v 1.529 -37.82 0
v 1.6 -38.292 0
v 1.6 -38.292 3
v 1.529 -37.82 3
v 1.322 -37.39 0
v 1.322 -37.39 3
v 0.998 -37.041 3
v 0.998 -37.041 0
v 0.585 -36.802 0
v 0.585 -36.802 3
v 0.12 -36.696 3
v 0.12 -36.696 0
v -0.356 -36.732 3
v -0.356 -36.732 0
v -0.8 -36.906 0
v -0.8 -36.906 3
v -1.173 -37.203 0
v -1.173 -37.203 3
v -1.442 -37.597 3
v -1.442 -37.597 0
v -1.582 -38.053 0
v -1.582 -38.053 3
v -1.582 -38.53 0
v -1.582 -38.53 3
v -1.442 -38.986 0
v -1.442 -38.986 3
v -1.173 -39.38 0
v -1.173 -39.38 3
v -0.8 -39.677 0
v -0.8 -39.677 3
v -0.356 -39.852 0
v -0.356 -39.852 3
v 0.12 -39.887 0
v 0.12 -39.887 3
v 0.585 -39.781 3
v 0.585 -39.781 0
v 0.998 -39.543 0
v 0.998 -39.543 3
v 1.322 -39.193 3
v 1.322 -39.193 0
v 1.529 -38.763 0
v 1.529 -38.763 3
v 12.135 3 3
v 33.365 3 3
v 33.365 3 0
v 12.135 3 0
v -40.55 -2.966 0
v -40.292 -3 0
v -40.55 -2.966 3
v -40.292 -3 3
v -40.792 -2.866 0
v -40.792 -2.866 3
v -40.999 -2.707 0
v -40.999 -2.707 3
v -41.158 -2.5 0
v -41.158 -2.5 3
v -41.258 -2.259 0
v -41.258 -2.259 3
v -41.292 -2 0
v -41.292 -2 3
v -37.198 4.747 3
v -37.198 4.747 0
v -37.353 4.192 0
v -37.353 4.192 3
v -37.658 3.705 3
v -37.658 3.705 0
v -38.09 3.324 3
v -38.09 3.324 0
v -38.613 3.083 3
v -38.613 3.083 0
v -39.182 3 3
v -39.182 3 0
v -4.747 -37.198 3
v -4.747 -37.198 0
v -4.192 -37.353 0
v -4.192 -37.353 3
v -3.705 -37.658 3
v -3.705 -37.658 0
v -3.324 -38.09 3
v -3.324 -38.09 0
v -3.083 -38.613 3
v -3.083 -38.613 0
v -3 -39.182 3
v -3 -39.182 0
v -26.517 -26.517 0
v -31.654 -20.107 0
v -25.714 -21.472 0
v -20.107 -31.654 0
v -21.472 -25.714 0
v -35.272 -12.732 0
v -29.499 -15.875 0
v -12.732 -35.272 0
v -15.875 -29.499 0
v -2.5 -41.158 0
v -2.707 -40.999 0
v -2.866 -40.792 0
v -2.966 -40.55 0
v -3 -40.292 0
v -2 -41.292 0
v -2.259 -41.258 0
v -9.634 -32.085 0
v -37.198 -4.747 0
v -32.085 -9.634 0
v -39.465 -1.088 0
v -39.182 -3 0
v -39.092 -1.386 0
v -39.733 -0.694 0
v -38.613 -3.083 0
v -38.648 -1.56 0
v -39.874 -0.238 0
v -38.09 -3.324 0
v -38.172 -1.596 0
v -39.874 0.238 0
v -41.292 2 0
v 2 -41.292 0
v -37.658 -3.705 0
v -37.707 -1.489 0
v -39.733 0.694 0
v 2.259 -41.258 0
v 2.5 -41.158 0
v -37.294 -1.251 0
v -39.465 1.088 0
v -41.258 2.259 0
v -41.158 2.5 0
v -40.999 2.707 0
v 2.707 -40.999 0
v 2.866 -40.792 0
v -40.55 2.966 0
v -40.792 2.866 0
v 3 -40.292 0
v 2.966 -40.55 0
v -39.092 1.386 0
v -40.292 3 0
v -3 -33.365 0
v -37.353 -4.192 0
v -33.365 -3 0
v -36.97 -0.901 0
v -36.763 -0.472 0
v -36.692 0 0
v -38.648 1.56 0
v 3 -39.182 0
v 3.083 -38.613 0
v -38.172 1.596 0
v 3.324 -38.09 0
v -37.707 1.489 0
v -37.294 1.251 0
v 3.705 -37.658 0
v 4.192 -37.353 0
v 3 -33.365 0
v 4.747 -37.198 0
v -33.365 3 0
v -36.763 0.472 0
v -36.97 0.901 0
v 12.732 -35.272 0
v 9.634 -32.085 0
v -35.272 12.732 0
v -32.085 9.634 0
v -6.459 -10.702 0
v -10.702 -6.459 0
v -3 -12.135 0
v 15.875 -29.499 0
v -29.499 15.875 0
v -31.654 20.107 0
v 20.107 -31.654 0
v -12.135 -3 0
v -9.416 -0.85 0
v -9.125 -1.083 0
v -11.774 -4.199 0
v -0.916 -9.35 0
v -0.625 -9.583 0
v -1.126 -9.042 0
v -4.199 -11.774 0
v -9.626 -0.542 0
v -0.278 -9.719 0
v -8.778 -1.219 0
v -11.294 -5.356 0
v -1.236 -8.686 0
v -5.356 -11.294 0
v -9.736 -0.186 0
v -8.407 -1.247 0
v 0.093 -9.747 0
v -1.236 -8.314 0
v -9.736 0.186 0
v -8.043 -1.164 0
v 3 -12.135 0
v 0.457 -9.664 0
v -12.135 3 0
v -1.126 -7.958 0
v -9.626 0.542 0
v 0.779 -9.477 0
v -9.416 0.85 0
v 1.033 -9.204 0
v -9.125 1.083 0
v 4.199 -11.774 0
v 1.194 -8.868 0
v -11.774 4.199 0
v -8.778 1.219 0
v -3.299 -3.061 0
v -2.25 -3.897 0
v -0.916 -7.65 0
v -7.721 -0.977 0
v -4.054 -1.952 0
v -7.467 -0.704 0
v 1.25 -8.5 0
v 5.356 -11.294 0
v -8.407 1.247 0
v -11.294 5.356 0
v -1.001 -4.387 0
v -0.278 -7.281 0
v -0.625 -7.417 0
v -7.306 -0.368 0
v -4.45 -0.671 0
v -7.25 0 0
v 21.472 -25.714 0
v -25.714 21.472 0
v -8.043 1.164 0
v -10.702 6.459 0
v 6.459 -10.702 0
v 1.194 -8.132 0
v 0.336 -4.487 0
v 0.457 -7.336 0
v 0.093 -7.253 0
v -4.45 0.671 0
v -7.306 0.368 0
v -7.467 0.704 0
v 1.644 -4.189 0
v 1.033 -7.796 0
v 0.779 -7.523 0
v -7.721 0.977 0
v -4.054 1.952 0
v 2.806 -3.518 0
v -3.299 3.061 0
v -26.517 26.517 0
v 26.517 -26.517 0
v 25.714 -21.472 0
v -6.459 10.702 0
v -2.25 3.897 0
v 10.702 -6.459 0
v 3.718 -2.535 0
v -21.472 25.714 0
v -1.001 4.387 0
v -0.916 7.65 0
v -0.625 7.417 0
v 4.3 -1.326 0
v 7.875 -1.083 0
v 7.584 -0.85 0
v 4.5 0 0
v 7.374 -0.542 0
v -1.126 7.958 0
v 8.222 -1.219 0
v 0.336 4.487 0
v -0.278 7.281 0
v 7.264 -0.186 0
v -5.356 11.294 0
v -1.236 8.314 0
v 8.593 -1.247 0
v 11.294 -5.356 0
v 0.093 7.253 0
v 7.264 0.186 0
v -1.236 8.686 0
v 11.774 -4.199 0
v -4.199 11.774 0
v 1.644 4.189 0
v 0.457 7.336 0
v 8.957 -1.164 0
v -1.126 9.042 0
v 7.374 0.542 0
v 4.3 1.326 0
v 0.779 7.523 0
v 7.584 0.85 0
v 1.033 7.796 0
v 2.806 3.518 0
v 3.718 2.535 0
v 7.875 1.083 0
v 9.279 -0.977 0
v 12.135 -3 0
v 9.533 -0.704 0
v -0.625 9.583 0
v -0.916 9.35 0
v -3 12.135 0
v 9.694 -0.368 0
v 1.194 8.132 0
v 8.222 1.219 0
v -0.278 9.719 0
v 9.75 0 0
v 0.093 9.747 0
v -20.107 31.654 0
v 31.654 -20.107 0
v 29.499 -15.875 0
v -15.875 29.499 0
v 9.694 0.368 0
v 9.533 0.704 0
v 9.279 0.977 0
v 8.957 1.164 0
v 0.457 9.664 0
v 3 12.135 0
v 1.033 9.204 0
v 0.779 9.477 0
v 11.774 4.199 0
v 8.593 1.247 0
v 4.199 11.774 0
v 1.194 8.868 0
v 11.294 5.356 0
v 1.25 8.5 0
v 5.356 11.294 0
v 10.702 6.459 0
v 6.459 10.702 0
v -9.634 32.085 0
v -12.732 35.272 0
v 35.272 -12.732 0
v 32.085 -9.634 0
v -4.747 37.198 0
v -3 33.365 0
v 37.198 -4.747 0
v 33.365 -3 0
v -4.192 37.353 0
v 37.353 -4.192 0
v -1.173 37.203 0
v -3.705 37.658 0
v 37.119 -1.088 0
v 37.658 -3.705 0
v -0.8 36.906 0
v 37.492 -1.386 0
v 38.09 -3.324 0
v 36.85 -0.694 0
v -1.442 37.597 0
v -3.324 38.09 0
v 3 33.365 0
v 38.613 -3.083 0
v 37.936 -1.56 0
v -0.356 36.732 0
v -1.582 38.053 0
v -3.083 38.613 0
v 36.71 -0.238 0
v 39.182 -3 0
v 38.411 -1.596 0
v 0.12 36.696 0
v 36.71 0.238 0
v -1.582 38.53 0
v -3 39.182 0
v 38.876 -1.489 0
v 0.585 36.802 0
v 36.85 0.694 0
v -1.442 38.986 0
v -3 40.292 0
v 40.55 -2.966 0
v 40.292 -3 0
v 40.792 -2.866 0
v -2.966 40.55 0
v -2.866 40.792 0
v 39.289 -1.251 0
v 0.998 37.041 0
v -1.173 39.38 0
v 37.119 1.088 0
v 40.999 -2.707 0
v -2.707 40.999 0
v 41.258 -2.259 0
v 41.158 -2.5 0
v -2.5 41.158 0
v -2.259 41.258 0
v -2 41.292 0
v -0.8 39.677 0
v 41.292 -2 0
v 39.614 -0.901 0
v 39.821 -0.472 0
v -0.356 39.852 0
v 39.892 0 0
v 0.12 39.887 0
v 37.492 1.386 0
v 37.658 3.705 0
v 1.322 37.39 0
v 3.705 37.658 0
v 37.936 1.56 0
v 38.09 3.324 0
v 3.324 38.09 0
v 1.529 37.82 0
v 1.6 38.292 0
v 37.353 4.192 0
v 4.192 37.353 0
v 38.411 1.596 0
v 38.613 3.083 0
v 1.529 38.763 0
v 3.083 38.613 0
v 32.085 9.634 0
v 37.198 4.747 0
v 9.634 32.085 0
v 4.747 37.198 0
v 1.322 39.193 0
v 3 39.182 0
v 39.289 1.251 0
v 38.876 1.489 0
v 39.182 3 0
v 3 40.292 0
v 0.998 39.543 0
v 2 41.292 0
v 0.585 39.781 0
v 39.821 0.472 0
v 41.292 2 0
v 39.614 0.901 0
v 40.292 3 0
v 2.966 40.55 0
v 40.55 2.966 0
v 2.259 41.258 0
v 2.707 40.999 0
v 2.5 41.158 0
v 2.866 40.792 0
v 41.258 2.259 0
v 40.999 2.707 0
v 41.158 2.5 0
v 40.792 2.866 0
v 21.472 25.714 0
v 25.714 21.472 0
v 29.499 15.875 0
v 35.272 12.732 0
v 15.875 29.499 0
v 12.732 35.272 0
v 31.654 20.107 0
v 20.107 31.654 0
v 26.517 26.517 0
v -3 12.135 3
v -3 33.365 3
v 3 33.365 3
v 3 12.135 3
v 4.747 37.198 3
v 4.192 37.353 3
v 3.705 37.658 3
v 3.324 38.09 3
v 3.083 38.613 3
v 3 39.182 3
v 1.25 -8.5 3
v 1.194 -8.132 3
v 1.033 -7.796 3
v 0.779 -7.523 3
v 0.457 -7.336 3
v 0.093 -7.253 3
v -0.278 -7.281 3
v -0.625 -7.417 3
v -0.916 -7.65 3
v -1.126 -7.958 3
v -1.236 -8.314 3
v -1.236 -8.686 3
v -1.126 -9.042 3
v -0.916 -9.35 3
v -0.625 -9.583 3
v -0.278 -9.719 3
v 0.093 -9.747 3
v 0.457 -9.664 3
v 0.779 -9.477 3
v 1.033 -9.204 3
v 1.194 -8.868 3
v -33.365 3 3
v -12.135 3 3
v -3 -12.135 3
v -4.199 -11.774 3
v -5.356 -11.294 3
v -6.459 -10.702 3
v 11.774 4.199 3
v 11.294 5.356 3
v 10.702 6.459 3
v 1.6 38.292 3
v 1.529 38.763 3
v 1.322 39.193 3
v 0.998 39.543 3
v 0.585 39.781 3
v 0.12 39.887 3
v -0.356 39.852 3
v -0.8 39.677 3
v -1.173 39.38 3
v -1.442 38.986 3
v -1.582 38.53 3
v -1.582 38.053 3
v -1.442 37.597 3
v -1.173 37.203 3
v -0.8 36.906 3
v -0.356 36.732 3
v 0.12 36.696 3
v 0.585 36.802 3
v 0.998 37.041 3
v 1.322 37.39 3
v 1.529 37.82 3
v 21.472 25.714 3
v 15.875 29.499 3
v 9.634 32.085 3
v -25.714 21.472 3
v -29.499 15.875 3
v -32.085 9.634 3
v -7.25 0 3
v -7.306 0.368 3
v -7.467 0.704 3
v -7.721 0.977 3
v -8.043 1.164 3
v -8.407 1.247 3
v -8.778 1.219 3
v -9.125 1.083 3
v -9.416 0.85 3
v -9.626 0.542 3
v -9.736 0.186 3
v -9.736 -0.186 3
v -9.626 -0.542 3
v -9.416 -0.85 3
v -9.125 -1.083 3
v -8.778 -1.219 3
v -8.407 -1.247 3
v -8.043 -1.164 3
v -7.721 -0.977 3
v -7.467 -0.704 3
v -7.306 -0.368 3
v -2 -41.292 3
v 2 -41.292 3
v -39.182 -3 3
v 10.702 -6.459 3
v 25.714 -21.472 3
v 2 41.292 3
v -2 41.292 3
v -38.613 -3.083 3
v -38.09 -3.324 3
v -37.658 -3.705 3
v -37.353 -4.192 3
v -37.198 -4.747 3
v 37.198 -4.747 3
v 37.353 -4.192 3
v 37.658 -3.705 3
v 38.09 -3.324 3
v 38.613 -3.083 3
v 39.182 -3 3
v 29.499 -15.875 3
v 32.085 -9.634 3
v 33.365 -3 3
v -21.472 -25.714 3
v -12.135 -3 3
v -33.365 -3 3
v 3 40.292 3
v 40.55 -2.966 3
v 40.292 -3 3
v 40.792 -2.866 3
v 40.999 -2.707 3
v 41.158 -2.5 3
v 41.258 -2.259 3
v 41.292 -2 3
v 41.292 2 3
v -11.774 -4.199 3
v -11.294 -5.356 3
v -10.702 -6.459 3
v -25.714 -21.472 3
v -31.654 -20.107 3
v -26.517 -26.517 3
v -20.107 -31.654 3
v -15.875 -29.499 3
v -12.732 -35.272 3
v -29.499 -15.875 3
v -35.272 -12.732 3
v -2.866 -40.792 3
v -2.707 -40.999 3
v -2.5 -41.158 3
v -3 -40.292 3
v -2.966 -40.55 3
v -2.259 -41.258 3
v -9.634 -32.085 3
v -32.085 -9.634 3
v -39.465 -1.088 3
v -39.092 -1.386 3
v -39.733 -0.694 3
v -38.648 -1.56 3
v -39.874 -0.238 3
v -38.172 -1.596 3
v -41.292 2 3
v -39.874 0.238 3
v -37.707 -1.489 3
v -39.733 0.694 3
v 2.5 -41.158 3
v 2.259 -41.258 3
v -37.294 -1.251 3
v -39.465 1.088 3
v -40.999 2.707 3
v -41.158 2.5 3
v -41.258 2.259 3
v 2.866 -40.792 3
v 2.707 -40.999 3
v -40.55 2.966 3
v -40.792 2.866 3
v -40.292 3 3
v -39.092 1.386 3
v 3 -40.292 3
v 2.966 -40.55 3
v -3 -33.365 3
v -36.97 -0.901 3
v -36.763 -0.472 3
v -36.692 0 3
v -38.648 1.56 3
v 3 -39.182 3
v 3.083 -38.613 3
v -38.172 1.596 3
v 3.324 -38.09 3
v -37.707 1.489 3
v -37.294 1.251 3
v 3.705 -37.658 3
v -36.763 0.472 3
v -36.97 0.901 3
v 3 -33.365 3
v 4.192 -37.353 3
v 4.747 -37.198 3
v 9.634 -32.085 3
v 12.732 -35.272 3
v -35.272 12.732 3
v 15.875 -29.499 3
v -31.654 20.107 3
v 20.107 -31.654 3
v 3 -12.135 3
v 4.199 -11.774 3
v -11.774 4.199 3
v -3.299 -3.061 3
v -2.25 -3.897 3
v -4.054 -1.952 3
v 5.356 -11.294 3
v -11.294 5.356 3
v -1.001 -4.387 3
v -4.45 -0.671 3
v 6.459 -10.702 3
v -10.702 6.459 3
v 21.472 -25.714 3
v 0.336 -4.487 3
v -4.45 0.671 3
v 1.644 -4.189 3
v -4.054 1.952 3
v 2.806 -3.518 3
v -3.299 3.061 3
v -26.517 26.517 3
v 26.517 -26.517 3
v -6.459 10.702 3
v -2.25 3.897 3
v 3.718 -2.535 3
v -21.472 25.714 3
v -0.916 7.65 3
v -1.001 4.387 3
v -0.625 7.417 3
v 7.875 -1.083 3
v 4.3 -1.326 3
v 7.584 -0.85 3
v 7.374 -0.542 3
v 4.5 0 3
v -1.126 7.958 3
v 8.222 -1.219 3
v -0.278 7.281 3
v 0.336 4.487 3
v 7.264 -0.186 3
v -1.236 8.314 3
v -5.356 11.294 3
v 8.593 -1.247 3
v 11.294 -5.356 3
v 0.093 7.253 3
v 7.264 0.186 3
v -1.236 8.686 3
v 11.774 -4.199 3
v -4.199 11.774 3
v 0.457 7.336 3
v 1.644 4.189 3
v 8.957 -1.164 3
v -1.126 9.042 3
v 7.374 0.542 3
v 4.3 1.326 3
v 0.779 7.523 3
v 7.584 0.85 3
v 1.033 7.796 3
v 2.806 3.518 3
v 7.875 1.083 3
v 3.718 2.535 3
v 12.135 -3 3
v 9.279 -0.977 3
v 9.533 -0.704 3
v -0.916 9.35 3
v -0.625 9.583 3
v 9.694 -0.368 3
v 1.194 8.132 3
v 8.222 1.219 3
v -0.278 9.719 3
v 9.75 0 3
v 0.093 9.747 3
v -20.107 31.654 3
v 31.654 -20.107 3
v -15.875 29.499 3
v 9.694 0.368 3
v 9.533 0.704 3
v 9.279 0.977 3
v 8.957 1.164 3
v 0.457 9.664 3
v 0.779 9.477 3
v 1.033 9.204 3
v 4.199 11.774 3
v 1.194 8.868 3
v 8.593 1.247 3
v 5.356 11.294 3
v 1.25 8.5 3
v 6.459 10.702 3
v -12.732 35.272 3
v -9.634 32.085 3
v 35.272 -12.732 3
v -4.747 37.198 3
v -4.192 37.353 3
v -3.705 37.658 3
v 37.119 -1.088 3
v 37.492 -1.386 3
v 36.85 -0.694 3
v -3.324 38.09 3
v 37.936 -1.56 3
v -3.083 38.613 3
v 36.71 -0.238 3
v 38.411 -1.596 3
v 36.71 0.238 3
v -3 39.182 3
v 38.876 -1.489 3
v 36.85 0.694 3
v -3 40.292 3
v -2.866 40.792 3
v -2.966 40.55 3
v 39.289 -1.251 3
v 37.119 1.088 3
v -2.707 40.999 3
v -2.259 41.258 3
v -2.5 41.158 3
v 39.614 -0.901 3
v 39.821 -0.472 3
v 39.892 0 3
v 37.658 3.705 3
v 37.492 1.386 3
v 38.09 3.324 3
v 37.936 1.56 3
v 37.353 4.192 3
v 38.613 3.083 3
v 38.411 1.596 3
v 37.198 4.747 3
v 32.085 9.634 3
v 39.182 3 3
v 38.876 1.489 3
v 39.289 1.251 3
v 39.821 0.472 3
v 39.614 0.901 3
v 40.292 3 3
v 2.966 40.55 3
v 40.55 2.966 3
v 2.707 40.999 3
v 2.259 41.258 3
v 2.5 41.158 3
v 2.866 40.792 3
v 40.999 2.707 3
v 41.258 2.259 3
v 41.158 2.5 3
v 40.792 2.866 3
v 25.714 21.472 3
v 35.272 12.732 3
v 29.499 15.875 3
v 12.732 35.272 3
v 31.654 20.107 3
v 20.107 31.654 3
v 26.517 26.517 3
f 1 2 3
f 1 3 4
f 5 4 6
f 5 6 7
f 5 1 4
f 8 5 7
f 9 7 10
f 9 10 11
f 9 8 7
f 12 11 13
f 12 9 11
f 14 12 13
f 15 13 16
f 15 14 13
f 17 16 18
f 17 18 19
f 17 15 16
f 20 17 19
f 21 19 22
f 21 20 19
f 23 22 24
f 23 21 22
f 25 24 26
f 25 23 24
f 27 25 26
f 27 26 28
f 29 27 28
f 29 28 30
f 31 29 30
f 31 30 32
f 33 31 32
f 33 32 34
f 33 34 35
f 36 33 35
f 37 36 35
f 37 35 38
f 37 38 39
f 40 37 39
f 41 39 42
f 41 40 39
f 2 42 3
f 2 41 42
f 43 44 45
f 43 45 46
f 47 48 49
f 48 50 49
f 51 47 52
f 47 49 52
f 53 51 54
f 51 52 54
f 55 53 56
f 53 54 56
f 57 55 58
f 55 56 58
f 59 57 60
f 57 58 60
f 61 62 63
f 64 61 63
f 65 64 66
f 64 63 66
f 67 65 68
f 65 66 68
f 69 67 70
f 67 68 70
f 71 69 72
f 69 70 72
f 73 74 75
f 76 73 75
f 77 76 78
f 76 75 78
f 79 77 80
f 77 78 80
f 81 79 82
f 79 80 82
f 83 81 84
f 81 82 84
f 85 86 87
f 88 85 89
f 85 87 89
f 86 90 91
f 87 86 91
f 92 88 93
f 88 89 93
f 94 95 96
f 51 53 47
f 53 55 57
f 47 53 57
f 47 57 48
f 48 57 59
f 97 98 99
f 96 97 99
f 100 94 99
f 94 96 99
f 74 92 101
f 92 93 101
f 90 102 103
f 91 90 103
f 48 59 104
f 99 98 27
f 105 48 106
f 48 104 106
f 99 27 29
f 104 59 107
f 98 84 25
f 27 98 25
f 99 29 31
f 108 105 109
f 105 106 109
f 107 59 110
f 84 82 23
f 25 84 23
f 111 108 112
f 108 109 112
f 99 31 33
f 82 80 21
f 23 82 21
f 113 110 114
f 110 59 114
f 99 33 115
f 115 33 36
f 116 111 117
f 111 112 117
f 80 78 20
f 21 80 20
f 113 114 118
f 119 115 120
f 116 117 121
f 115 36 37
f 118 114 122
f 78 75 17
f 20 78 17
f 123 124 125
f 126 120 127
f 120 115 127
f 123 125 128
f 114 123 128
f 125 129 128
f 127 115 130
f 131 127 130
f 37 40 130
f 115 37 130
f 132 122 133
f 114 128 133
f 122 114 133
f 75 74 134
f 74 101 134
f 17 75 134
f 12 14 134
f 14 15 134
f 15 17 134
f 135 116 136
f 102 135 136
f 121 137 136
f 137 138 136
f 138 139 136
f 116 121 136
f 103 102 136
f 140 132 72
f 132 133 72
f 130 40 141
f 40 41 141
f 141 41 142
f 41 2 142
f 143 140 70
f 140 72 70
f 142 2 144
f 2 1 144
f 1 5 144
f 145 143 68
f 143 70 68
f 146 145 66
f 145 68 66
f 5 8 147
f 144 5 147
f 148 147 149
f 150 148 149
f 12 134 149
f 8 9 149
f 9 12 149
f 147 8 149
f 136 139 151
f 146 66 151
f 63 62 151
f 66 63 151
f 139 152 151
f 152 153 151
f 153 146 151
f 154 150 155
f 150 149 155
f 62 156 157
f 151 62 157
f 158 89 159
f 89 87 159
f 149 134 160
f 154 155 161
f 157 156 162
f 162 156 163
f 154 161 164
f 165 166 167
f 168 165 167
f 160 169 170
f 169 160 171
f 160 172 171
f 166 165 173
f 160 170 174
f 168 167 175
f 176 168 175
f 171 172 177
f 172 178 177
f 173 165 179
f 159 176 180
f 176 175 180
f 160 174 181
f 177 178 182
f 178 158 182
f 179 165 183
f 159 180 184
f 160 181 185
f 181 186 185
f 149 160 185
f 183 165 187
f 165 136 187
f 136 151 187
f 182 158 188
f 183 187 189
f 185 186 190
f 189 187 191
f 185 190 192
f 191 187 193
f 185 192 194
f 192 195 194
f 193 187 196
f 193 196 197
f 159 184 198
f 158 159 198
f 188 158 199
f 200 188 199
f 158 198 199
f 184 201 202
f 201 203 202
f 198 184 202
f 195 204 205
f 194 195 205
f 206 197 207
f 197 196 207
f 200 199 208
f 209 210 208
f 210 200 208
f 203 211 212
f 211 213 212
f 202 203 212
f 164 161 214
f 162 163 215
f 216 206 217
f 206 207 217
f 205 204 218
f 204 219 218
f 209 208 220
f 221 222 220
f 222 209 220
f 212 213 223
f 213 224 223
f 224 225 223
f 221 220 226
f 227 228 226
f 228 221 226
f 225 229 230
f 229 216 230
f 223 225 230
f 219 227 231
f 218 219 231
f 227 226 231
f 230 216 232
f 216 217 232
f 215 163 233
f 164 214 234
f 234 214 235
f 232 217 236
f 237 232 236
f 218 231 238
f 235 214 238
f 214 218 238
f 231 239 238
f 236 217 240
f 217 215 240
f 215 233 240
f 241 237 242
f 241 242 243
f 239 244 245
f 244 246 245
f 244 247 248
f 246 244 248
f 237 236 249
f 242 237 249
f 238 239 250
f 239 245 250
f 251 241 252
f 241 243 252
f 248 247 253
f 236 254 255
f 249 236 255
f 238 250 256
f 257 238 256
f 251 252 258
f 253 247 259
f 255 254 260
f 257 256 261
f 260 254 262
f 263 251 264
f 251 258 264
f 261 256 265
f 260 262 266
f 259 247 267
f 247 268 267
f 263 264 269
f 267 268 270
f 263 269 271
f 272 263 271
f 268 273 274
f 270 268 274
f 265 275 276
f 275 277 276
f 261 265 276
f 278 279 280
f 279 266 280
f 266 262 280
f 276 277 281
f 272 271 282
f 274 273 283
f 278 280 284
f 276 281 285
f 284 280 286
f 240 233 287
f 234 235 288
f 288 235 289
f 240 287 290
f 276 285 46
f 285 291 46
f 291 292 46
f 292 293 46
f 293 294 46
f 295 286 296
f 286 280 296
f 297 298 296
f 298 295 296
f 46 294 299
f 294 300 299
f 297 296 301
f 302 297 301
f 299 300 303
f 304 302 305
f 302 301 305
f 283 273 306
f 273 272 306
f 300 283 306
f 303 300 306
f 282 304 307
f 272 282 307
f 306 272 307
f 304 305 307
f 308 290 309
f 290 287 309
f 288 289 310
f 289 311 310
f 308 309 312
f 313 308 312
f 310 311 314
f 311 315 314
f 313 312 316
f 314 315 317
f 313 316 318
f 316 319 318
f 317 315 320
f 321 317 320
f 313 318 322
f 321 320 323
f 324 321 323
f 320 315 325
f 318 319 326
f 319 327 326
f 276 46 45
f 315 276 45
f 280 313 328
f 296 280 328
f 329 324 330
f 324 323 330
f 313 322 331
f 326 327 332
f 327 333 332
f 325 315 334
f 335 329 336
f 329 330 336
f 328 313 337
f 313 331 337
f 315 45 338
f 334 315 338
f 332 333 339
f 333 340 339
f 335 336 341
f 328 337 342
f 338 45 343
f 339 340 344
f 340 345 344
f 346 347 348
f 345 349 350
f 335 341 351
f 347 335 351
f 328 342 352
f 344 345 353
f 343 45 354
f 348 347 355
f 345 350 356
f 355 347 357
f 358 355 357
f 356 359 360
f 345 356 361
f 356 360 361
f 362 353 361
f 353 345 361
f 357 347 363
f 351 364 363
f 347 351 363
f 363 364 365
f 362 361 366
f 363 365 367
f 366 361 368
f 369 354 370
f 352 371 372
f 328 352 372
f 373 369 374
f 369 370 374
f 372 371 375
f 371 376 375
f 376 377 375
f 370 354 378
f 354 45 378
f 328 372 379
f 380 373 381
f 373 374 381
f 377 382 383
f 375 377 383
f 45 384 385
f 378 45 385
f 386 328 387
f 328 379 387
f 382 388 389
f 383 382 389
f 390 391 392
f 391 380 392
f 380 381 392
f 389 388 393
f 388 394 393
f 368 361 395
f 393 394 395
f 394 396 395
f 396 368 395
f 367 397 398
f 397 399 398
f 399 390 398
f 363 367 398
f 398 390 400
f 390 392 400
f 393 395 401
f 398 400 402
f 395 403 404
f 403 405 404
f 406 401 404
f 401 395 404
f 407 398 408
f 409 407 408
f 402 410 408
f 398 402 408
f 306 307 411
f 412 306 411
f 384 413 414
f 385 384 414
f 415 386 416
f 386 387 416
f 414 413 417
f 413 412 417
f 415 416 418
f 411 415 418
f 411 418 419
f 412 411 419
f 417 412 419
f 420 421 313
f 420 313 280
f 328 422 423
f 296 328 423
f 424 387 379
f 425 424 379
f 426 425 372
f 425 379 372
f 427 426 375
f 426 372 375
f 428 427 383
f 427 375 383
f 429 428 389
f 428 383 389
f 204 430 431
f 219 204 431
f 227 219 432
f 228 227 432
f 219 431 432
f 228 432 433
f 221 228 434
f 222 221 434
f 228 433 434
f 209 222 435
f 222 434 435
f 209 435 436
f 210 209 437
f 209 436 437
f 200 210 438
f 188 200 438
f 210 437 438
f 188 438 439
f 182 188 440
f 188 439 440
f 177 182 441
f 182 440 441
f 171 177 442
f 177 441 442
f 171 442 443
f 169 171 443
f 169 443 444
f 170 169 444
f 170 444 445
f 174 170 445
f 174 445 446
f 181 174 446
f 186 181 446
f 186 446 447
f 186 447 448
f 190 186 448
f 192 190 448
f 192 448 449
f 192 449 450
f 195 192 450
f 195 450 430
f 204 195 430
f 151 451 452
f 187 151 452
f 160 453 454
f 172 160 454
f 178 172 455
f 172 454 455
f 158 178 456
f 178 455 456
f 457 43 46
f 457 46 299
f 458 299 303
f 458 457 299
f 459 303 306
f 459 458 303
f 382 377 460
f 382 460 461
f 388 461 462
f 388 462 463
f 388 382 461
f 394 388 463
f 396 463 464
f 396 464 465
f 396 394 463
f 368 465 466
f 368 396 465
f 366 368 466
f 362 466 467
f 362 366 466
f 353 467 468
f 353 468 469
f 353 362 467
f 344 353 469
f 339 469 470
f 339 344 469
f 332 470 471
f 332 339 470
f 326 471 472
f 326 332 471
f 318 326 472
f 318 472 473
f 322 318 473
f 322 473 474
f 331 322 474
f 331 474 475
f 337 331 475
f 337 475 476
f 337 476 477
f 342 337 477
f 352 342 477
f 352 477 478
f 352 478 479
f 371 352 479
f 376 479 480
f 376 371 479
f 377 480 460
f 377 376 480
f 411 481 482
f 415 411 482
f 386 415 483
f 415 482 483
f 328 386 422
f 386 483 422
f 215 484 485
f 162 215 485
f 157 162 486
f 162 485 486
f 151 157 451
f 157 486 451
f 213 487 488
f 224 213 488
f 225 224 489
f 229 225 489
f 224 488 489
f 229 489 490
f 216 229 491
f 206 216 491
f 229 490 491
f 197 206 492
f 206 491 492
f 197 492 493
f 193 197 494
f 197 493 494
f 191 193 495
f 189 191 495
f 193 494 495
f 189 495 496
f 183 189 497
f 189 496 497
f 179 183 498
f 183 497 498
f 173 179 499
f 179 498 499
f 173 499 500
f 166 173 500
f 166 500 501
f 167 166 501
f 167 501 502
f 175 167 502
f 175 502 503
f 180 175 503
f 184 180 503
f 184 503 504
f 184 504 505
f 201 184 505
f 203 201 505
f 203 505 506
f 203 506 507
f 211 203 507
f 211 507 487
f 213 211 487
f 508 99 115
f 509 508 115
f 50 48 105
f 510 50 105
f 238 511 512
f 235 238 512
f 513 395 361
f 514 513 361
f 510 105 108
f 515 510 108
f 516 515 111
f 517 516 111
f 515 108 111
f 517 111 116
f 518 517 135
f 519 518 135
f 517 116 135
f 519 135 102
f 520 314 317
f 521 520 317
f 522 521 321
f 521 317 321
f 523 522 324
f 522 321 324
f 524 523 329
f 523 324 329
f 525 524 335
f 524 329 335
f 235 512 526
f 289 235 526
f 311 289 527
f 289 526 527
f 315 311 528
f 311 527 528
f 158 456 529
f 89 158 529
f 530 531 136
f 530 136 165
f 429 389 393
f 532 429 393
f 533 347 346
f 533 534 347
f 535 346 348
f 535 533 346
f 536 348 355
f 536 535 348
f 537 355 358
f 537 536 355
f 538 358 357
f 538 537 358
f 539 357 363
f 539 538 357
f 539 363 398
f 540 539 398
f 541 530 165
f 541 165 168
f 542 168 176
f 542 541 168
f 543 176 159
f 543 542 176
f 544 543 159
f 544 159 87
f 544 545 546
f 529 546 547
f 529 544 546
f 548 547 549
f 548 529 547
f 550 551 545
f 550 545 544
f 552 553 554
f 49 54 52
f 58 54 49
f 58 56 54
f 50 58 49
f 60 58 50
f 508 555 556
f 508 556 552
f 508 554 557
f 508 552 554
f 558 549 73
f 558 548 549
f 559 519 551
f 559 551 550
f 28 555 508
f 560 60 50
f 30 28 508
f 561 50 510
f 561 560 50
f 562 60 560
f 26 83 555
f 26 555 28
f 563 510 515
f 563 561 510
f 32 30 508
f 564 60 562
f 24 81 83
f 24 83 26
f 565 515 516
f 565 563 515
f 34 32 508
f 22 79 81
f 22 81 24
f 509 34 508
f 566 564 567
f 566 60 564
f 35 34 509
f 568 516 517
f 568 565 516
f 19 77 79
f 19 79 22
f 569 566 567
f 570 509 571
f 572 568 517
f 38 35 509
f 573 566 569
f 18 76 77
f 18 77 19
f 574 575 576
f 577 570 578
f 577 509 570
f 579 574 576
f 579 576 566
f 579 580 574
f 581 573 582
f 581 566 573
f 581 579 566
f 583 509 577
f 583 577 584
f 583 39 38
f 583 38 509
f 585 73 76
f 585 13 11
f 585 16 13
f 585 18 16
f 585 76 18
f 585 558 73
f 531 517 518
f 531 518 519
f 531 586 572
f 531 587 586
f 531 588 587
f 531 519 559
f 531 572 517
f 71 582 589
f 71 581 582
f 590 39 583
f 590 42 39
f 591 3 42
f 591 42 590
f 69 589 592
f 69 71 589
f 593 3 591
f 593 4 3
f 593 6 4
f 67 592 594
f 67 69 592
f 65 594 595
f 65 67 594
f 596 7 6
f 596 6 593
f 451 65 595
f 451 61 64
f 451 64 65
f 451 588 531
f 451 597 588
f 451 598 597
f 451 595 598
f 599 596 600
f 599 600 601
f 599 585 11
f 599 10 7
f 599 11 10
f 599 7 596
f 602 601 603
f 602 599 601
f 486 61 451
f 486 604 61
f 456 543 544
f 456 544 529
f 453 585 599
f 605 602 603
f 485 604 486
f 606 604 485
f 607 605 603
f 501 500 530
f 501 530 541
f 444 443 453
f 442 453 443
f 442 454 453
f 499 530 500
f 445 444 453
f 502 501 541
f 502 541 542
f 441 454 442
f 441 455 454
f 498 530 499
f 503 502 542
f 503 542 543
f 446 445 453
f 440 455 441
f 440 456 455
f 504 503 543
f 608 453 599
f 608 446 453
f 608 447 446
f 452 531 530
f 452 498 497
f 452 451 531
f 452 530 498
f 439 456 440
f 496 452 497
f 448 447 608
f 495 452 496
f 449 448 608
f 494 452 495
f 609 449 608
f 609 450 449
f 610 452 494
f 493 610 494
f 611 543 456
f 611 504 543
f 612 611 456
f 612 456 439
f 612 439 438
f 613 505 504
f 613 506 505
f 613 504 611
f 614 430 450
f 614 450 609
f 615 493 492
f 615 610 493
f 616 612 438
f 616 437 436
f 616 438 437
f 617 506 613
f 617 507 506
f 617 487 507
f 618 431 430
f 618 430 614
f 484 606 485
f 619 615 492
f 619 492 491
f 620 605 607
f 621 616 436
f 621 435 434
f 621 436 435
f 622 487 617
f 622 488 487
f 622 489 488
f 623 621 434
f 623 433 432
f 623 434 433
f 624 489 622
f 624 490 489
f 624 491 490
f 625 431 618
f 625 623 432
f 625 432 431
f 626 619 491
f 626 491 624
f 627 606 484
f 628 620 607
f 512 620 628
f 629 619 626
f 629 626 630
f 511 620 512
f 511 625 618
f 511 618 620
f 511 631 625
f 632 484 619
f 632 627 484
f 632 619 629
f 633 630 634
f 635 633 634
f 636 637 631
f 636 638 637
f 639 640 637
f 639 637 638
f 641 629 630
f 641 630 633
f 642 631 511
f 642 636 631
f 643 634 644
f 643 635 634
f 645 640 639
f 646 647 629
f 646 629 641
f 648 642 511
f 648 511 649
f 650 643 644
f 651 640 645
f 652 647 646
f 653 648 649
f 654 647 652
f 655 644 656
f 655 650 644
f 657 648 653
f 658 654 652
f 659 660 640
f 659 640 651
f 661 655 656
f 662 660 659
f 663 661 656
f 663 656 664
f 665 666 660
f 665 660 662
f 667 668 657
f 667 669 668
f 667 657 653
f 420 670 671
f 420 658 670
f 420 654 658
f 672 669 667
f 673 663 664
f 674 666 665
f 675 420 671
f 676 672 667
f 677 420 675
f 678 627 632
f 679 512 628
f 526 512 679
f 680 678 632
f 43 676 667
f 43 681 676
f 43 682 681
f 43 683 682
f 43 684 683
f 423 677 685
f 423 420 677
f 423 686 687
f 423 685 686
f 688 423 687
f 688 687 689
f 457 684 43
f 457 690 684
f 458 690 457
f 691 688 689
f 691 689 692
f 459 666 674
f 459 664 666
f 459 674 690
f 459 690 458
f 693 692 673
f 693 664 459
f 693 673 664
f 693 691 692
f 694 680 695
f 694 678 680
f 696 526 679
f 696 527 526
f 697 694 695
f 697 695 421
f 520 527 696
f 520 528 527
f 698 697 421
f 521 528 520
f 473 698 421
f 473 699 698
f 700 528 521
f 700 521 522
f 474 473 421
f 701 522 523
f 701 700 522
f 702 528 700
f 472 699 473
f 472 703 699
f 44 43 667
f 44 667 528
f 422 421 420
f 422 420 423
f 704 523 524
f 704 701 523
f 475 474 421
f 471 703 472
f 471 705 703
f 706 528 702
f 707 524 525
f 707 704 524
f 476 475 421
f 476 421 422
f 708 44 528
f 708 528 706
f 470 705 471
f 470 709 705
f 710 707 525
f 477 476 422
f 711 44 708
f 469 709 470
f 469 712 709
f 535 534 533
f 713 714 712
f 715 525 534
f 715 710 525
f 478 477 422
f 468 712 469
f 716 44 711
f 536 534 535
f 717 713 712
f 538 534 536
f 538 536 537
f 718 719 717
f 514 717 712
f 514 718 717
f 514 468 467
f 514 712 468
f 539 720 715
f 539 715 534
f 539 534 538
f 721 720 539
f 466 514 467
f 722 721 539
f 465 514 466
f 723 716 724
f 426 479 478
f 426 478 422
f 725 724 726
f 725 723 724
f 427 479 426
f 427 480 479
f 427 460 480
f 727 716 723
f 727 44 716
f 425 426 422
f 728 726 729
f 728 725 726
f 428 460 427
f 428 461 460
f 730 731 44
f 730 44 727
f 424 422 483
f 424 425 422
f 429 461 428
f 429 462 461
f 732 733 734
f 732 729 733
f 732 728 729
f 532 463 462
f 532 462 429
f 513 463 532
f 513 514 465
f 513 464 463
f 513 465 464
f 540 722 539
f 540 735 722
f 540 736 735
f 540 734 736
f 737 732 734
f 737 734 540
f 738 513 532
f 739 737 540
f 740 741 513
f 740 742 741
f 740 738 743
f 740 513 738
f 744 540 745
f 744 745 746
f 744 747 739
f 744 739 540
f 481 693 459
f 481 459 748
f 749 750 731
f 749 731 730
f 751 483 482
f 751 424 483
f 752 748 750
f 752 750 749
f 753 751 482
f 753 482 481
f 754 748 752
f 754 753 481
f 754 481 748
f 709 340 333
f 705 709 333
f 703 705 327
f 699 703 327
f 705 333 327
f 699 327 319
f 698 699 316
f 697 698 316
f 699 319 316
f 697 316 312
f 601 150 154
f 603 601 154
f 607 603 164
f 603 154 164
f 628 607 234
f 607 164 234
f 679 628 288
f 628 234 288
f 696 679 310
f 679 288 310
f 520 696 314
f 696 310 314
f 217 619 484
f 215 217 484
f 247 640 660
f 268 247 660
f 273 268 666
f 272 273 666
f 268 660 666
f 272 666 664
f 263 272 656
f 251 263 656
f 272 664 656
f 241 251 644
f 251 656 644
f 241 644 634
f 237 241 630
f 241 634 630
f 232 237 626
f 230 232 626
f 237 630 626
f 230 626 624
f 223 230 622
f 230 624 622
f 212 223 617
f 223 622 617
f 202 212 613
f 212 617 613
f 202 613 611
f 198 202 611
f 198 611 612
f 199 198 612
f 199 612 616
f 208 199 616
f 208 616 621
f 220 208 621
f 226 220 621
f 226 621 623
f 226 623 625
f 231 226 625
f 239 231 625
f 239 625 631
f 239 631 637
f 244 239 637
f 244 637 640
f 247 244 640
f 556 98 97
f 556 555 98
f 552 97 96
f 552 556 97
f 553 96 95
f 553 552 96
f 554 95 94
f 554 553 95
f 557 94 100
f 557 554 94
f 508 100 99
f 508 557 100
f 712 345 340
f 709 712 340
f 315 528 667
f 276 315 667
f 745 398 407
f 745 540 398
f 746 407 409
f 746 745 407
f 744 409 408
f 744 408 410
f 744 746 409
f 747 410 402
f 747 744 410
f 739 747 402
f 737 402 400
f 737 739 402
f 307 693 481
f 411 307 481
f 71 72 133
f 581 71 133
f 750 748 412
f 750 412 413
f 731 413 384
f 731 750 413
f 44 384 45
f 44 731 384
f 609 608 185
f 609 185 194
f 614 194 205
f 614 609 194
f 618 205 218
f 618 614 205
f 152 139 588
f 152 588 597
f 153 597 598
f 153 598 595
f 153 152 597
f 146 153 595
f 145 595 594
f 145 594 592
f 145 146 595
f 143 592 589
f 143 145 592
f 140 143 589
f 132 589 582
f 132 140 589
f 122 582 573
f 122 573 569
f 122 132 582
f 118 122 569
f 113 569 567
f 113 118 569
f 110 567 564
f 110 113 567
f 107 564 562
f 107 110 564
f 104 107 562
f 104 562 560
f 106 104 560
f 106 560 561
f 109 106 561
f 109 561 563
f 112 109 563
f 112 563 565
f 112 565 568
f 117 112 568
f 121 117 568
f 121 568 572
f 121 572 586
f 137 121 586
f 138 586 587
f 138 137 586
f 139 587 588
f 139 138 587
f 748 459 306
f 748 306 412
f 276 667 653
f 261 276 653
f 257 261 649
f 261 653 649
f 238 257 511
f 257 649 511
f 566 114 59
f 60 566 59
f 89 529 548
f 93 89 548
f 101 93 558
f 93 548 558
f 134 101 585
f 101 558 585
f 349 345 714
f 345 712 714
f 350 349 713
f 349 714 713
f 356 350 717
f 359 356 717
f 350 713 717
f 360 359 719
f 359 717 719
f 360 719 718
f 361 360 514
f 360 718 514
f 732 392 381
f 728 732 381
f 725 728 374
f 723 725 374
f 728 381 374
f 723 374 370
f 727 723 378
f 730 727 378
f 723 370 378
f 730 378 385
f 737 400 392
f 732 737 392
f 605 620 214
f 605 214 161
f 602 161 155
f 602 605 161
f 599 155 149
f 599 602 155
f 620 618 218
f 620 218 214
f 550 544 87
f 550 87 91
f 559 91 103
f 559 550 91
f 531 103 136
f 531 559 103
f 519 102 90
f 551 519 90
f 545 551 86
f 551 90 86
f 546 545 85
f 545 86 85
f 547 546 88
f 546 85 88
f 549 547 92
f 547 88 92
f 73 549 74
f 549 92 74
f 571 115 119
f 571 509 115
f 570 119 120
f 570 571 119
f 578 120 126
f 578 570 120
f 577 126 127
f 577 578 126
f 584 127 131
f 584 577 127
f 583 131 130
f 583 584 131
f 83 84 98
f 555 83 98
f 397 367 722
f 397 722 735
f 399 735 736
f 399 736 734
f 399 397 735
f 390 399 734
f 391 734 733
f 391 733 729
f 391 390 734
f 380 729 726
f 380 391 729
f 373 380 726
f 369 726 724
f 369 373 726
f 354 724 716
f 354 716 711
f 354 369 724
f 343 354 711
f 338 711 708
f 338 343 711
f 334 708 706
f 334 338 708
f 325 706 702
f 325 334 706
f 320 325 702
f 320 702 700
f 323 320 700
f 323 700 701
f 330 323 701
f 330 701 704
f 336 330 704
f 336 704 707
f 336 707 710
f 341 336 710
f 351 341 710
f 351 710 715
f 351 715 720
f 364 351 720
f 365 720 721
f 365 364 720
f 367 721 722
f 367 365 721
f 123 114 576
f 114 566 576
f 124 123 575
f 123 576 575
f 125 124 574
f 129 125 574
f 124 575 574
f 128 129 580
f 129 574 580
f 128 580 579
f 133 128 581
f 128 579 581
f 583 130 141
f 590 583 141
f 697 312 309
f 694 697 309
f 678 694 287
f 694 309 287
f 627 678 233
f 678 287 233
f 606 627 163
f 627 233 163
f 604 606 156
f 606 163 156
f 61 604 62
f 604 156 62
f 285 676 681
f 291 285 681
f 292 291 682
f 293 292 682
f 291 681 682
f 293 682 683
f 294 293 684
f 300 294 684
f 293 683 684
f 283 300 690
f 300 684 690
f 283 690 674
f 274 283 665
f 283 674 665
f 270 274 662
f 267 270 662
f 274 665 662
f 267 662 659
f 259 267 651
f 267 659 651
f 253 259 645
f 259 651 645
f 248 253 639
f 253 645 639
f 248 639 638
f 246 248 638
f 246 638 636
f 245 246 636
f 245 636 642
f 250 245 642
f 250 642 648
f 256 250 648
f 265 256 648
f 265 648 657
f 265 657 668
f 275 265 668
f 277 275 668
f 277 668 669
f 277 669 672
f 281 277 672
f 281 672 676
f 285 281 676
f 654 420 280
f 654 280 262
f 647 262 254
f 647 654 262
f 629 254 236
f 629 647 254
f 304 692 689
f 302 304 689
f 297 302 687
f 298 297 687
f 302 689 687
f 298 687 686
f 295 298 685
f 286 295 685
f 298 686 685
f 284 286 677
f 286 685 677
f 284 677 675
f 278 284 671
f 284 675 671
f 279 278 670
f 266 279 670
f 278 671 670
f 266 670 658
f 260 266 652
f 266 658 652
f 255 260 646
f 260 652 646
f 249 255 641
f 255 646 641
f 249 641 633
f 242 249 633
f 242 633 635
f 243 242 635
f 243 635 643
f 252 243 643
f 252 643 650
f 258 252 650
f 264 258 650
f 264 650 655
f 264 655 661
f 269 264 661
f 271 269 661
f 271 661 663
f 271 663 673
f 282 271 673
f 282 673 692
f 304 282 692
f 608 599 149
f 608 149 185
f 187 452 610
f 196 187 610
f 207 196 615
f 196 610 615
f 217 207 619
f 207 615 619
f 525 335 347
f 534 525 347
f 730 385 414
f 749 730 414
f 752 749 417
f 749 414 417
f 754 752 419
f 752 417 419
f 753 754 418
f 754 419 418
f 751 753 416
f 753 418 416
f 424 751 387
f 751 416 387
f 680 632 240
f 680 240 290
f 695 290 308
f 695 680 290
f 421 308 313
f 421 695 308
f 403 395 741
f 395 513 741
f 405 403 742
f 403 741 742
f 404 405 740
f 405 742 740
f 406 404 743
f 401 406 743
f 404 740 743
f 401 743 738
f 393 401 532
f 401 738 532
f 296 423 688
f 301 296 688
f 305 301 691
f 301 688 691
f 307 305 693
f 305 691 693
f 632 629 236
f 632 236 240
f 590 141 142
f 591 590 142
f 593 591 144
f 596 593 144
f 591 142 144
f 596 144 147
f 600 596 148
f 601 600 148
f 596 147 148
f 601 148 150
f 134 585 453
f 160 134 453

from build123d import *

# Parameters (mm, degrees)
SKETCH_1_R          = 1.6
EXTRUDE_1_DEPTH     = 3
SKETCH_3_R          = 4.5
SKETCH_3_R_2        = 1.25
CUT_EXTRUDE_1_DEPTH = 4
CUT_EXTRUDE_2_DEPTH = 4
FILLET_1_R          = 1


with BuildPart() as part:
    # ｽｹｯﾁ1 → ﾎﾞｽ - 押し出し1 (new body)
    with BuildSketch(Plane.XY):
        with BuildLine():
            Line((-3, -39.182266397), (-3, -41.291643997))
            Line((-3, -41.291643997), (3, -41.291643997))
            Line((3, -41.291643997), (3, -39.182266397))
            ThreePointArc((3, -39.182266397), (3.498945518, -37.860587373), (4.746835443, -37.198354174))
            ThreePointArc((4.746835443, -37.198354174), (26.516504294, -26.516504294), (37.198354174, -4.746835443))
            ThreePointArc((37.198354174, -4.746835443), (37.860587373, -3.498945518), (39.182266397, -3))
            Line((39.182266397, -3), (41.291643997, -3))
            Line((41.291643997, -3), (41.291643997, 3))
            Line((41.291643997, 3), (39.182266397, 3))
            ThreePointArc((39.182266397, 3), (37.860587373, 3.498945518), (37.198354174, 4.746835443))
            ThreePointArc((37.198354174, 4.746835443), (26.516504294, 26.516504294), (4.746835443, 37.198354174))
            ThreePointArc((4.746835443, 37.198354174), (3.498945518, 37.860587373), (3, 39.182266397))
            Line((3, 39.182266397), (3, 41.291643997))
            Line((3, 41.291643997), (-3, 41.291643997))
            Line((-3, 41.291643997), (-3, 39.182266397))
            ThreePointArc((-3, 39.182266397), (-3.498945518, 37.860587373), (-4.746835443, 37.198354174))
            ThreePointArc((-4.746835443, 37.198354174), (-26.516504294, 26.516504294), (-37.198354174, 4.746835443))
            ThreePointArc((-37.198354174, 4.746835443), (-37.860587373, 3.498945518), (-39.182266397, 3))
            Line((-39.182266397, 3), (-41.291643997, 3))
            Line((-41.291643997, 3), (-41.291643997, -3))
            Line((-41.291643997, -3), (-39.182266397, -3))
            ThreePointArc((-39.182266397, -3), (-37.860587373, -3.498945518), (-37.198354174, -4.746835443))
            ThreePointArc((-37.198354174, -4.746835443), (-26.516504294, -26.516504294), (-4.746835443, -37.198354174))
            ThreePointArc((-4.746835443, -37.198354174), (-3.498945518, -37.860587373), (-3, -39.182266397))
        make_face()
        with Locations((-38.291643997, 0)):
            Circle(SKETCH_1_R, mode=Mode.SUBTRACT)
        with Locations((0, -38.291643997)):
            Circle(SKETCH_1_R, mode=Mode.SUBTRACT)
        with Locations((0, 38.291643997)):
            Circle(SKETCH_1_R, mode=Mode.SUBTRACT)
        with Locations((38.291643997, 0)):
            Circle(SKETCH_1_R, mode=Mode.SUBTRACT)
    extrude(amount=EXTRUDE_1_DEPTH)

    # ｽｹｯﾁ3 → ｶｯﾄ - 押し出し1 (cut, through all)
    with BuildSketch(Plane.XY.offset(3)):
        Circle(SKETCH_3_R)
        with Locations((0, 8.5)):
            Circle(SKETCH_3_R_2)
        with Locations((8.5, 0)):
            Circle(SKETCH_3_R_2)
        with Locations((0, -8.5)):
            Circle(SKETCH_3_R_2)
        with Locations((-8.5, 0)):
            Circle(SKETCH_3_R_2)
    extrude(amount=-CUT_EXTRUDE_1_DEPTH, mode=Mode.SUBTRACT)

    # ｽｹｯﾁ4 → ｶｯﾄ - 押し出し2 (cut, through all)
    with BuildSketch(Plane.XY.offset(3)):
        with BuildLine():
            Line((-3, 33.365401241), (-3, 12.1346611))
            ThreePointArc((-3, 12.1346611), (-4.783542905, 11.548494156), (-6.459180807, 10.701821494))
            Line((-6.459180807, 10.701821494), (-21.471581131, 25.714221818))
            ThreePointArc((-21.471581131, 25.714221818), (-12.819894984, 30.949964339), (-3, 33.365401241))
        make_face()
        with BuildLine():
            Line((3, 33.365401241), (3, 12.1346611))
            ThreePointArc((3, 12.1346611), (4.783542905, 11.548494156), (6.459180807, 10.701821494))
            Line((6.459180807, 10.701821494), (21.471581131, 25.714221818))
            ThreePointArc((21.471581131, 25.714221818), (12.819894984, 30.949964339), (3, 33.365401241))
        make_face()
        with BuildLine():
            Line((33.365401241, 3), (12.1346611, 3))
            ThreePointArc((12.1346611, 3), (11.548494156, 4.783542905), (10.701821494, 6.459180807))
            Line((10.701821494, 6.459180807), (25.714221818, 21.471581131))
            ThreePointArc((25.714221818, 21.471581131), (30.949964339, 12.819894984), (33.365401241, 3))
        make_face()
        with BuildLine():
            Line((33.365401241, -3), (12.1346611, -3))
            ThreePointArc((12.1346611, -3), (11.548494156, -4.783542905), (10.701821494, -6.459180807))
            Line((10.701821494, -6.459180807), (25.714221818, -21.471581131))
            ThreePointArc((25.714221818, -21.471581131), (30.949964339, -12.819894984), (33.365401241, -3))
        make_face()
        with BuildLine():
            Line((3, -33.365401241), (3, -12.1346611))
            ThreePointArc((3, -12.1346611), (4.783542905, -11.548494156), (6.459180807, -10.701821494))
            Line((6.459180807, -10.701821494), (21.471581131, -25.714221818))
            ThreePointArc((21.471581131, -25.714221818), (12.819894984, -30.949964339), (3, -33.365401241))
        make_face()
        with BuildLine():
            Line((-3, -33.365401241), (-3, -12.1346611))
            ThreePointArc((-3, -12.1346611), (-4.783542905, -11.548494156), (-6.459180807, -10.701821494))
            Line((-6.459180807, -10.701821494), (-21.471581131, -25.714221818))
            ThreePointArc((-21.471581131, -25.714221818), (-12.819894984, -30.949964339), (-3, -33.365401241))
        make_face()
        with BuildLine():
            Line((-33.365401241, -3), (-12.1346611, -3))
            ThreePointArc((-12.1346611, -3), (-11.548494156, -4.783542905), (-10.701821494, -6.459180807))
            Line((-10.701821494, -6.459180807), (-25.714221818, -21.471581131))
            ThreePointArc((-25.714221818, -21.471581131), (-30.949964339, -12.819894984), (-33.365401241, -3))
        make_face()
        with BuildLine():
            Line((-33.365401241, 3), (-12.1346611, 3))
            ThreePointArc((-12.1346611, 3), (-11.548494156, 4.783542905), (-10.701821494, 6.459180807))
            Line((-10.701821494, 6.459180807), (-25.714221818, 21.471581131))
            ThreePointArc((-25.714221818, 21.471581131), (-30.949964339, 12.819894984), (-33.365401241, 3))
        make_face()
    extrude(amount=-CUT_EXTRUDE_2_DEPTH, mode=Mode.SUBTRACT)

    # ﾌｨﾚｯﾄ1
    fillet_1_edges = [part.edges().sort_by_distance(p)[0] for p in [
        (-41.291643997, -3, 1.5),
        (-41.291643997, 3, 1.5),
        (-3, 41.291643997, 1.5),
        (3, 41.291643997, 1.5),
        (41.291643997, 3, 1.5),
        (41.291643997, -3, 1.5),
        (3, -41.291643997, 1.5),
        (-3, -41.291643997, 1.5),
    ]]
    fillet(fillet_1_edges, radius=FILLET_1_R)


solid = part.part
